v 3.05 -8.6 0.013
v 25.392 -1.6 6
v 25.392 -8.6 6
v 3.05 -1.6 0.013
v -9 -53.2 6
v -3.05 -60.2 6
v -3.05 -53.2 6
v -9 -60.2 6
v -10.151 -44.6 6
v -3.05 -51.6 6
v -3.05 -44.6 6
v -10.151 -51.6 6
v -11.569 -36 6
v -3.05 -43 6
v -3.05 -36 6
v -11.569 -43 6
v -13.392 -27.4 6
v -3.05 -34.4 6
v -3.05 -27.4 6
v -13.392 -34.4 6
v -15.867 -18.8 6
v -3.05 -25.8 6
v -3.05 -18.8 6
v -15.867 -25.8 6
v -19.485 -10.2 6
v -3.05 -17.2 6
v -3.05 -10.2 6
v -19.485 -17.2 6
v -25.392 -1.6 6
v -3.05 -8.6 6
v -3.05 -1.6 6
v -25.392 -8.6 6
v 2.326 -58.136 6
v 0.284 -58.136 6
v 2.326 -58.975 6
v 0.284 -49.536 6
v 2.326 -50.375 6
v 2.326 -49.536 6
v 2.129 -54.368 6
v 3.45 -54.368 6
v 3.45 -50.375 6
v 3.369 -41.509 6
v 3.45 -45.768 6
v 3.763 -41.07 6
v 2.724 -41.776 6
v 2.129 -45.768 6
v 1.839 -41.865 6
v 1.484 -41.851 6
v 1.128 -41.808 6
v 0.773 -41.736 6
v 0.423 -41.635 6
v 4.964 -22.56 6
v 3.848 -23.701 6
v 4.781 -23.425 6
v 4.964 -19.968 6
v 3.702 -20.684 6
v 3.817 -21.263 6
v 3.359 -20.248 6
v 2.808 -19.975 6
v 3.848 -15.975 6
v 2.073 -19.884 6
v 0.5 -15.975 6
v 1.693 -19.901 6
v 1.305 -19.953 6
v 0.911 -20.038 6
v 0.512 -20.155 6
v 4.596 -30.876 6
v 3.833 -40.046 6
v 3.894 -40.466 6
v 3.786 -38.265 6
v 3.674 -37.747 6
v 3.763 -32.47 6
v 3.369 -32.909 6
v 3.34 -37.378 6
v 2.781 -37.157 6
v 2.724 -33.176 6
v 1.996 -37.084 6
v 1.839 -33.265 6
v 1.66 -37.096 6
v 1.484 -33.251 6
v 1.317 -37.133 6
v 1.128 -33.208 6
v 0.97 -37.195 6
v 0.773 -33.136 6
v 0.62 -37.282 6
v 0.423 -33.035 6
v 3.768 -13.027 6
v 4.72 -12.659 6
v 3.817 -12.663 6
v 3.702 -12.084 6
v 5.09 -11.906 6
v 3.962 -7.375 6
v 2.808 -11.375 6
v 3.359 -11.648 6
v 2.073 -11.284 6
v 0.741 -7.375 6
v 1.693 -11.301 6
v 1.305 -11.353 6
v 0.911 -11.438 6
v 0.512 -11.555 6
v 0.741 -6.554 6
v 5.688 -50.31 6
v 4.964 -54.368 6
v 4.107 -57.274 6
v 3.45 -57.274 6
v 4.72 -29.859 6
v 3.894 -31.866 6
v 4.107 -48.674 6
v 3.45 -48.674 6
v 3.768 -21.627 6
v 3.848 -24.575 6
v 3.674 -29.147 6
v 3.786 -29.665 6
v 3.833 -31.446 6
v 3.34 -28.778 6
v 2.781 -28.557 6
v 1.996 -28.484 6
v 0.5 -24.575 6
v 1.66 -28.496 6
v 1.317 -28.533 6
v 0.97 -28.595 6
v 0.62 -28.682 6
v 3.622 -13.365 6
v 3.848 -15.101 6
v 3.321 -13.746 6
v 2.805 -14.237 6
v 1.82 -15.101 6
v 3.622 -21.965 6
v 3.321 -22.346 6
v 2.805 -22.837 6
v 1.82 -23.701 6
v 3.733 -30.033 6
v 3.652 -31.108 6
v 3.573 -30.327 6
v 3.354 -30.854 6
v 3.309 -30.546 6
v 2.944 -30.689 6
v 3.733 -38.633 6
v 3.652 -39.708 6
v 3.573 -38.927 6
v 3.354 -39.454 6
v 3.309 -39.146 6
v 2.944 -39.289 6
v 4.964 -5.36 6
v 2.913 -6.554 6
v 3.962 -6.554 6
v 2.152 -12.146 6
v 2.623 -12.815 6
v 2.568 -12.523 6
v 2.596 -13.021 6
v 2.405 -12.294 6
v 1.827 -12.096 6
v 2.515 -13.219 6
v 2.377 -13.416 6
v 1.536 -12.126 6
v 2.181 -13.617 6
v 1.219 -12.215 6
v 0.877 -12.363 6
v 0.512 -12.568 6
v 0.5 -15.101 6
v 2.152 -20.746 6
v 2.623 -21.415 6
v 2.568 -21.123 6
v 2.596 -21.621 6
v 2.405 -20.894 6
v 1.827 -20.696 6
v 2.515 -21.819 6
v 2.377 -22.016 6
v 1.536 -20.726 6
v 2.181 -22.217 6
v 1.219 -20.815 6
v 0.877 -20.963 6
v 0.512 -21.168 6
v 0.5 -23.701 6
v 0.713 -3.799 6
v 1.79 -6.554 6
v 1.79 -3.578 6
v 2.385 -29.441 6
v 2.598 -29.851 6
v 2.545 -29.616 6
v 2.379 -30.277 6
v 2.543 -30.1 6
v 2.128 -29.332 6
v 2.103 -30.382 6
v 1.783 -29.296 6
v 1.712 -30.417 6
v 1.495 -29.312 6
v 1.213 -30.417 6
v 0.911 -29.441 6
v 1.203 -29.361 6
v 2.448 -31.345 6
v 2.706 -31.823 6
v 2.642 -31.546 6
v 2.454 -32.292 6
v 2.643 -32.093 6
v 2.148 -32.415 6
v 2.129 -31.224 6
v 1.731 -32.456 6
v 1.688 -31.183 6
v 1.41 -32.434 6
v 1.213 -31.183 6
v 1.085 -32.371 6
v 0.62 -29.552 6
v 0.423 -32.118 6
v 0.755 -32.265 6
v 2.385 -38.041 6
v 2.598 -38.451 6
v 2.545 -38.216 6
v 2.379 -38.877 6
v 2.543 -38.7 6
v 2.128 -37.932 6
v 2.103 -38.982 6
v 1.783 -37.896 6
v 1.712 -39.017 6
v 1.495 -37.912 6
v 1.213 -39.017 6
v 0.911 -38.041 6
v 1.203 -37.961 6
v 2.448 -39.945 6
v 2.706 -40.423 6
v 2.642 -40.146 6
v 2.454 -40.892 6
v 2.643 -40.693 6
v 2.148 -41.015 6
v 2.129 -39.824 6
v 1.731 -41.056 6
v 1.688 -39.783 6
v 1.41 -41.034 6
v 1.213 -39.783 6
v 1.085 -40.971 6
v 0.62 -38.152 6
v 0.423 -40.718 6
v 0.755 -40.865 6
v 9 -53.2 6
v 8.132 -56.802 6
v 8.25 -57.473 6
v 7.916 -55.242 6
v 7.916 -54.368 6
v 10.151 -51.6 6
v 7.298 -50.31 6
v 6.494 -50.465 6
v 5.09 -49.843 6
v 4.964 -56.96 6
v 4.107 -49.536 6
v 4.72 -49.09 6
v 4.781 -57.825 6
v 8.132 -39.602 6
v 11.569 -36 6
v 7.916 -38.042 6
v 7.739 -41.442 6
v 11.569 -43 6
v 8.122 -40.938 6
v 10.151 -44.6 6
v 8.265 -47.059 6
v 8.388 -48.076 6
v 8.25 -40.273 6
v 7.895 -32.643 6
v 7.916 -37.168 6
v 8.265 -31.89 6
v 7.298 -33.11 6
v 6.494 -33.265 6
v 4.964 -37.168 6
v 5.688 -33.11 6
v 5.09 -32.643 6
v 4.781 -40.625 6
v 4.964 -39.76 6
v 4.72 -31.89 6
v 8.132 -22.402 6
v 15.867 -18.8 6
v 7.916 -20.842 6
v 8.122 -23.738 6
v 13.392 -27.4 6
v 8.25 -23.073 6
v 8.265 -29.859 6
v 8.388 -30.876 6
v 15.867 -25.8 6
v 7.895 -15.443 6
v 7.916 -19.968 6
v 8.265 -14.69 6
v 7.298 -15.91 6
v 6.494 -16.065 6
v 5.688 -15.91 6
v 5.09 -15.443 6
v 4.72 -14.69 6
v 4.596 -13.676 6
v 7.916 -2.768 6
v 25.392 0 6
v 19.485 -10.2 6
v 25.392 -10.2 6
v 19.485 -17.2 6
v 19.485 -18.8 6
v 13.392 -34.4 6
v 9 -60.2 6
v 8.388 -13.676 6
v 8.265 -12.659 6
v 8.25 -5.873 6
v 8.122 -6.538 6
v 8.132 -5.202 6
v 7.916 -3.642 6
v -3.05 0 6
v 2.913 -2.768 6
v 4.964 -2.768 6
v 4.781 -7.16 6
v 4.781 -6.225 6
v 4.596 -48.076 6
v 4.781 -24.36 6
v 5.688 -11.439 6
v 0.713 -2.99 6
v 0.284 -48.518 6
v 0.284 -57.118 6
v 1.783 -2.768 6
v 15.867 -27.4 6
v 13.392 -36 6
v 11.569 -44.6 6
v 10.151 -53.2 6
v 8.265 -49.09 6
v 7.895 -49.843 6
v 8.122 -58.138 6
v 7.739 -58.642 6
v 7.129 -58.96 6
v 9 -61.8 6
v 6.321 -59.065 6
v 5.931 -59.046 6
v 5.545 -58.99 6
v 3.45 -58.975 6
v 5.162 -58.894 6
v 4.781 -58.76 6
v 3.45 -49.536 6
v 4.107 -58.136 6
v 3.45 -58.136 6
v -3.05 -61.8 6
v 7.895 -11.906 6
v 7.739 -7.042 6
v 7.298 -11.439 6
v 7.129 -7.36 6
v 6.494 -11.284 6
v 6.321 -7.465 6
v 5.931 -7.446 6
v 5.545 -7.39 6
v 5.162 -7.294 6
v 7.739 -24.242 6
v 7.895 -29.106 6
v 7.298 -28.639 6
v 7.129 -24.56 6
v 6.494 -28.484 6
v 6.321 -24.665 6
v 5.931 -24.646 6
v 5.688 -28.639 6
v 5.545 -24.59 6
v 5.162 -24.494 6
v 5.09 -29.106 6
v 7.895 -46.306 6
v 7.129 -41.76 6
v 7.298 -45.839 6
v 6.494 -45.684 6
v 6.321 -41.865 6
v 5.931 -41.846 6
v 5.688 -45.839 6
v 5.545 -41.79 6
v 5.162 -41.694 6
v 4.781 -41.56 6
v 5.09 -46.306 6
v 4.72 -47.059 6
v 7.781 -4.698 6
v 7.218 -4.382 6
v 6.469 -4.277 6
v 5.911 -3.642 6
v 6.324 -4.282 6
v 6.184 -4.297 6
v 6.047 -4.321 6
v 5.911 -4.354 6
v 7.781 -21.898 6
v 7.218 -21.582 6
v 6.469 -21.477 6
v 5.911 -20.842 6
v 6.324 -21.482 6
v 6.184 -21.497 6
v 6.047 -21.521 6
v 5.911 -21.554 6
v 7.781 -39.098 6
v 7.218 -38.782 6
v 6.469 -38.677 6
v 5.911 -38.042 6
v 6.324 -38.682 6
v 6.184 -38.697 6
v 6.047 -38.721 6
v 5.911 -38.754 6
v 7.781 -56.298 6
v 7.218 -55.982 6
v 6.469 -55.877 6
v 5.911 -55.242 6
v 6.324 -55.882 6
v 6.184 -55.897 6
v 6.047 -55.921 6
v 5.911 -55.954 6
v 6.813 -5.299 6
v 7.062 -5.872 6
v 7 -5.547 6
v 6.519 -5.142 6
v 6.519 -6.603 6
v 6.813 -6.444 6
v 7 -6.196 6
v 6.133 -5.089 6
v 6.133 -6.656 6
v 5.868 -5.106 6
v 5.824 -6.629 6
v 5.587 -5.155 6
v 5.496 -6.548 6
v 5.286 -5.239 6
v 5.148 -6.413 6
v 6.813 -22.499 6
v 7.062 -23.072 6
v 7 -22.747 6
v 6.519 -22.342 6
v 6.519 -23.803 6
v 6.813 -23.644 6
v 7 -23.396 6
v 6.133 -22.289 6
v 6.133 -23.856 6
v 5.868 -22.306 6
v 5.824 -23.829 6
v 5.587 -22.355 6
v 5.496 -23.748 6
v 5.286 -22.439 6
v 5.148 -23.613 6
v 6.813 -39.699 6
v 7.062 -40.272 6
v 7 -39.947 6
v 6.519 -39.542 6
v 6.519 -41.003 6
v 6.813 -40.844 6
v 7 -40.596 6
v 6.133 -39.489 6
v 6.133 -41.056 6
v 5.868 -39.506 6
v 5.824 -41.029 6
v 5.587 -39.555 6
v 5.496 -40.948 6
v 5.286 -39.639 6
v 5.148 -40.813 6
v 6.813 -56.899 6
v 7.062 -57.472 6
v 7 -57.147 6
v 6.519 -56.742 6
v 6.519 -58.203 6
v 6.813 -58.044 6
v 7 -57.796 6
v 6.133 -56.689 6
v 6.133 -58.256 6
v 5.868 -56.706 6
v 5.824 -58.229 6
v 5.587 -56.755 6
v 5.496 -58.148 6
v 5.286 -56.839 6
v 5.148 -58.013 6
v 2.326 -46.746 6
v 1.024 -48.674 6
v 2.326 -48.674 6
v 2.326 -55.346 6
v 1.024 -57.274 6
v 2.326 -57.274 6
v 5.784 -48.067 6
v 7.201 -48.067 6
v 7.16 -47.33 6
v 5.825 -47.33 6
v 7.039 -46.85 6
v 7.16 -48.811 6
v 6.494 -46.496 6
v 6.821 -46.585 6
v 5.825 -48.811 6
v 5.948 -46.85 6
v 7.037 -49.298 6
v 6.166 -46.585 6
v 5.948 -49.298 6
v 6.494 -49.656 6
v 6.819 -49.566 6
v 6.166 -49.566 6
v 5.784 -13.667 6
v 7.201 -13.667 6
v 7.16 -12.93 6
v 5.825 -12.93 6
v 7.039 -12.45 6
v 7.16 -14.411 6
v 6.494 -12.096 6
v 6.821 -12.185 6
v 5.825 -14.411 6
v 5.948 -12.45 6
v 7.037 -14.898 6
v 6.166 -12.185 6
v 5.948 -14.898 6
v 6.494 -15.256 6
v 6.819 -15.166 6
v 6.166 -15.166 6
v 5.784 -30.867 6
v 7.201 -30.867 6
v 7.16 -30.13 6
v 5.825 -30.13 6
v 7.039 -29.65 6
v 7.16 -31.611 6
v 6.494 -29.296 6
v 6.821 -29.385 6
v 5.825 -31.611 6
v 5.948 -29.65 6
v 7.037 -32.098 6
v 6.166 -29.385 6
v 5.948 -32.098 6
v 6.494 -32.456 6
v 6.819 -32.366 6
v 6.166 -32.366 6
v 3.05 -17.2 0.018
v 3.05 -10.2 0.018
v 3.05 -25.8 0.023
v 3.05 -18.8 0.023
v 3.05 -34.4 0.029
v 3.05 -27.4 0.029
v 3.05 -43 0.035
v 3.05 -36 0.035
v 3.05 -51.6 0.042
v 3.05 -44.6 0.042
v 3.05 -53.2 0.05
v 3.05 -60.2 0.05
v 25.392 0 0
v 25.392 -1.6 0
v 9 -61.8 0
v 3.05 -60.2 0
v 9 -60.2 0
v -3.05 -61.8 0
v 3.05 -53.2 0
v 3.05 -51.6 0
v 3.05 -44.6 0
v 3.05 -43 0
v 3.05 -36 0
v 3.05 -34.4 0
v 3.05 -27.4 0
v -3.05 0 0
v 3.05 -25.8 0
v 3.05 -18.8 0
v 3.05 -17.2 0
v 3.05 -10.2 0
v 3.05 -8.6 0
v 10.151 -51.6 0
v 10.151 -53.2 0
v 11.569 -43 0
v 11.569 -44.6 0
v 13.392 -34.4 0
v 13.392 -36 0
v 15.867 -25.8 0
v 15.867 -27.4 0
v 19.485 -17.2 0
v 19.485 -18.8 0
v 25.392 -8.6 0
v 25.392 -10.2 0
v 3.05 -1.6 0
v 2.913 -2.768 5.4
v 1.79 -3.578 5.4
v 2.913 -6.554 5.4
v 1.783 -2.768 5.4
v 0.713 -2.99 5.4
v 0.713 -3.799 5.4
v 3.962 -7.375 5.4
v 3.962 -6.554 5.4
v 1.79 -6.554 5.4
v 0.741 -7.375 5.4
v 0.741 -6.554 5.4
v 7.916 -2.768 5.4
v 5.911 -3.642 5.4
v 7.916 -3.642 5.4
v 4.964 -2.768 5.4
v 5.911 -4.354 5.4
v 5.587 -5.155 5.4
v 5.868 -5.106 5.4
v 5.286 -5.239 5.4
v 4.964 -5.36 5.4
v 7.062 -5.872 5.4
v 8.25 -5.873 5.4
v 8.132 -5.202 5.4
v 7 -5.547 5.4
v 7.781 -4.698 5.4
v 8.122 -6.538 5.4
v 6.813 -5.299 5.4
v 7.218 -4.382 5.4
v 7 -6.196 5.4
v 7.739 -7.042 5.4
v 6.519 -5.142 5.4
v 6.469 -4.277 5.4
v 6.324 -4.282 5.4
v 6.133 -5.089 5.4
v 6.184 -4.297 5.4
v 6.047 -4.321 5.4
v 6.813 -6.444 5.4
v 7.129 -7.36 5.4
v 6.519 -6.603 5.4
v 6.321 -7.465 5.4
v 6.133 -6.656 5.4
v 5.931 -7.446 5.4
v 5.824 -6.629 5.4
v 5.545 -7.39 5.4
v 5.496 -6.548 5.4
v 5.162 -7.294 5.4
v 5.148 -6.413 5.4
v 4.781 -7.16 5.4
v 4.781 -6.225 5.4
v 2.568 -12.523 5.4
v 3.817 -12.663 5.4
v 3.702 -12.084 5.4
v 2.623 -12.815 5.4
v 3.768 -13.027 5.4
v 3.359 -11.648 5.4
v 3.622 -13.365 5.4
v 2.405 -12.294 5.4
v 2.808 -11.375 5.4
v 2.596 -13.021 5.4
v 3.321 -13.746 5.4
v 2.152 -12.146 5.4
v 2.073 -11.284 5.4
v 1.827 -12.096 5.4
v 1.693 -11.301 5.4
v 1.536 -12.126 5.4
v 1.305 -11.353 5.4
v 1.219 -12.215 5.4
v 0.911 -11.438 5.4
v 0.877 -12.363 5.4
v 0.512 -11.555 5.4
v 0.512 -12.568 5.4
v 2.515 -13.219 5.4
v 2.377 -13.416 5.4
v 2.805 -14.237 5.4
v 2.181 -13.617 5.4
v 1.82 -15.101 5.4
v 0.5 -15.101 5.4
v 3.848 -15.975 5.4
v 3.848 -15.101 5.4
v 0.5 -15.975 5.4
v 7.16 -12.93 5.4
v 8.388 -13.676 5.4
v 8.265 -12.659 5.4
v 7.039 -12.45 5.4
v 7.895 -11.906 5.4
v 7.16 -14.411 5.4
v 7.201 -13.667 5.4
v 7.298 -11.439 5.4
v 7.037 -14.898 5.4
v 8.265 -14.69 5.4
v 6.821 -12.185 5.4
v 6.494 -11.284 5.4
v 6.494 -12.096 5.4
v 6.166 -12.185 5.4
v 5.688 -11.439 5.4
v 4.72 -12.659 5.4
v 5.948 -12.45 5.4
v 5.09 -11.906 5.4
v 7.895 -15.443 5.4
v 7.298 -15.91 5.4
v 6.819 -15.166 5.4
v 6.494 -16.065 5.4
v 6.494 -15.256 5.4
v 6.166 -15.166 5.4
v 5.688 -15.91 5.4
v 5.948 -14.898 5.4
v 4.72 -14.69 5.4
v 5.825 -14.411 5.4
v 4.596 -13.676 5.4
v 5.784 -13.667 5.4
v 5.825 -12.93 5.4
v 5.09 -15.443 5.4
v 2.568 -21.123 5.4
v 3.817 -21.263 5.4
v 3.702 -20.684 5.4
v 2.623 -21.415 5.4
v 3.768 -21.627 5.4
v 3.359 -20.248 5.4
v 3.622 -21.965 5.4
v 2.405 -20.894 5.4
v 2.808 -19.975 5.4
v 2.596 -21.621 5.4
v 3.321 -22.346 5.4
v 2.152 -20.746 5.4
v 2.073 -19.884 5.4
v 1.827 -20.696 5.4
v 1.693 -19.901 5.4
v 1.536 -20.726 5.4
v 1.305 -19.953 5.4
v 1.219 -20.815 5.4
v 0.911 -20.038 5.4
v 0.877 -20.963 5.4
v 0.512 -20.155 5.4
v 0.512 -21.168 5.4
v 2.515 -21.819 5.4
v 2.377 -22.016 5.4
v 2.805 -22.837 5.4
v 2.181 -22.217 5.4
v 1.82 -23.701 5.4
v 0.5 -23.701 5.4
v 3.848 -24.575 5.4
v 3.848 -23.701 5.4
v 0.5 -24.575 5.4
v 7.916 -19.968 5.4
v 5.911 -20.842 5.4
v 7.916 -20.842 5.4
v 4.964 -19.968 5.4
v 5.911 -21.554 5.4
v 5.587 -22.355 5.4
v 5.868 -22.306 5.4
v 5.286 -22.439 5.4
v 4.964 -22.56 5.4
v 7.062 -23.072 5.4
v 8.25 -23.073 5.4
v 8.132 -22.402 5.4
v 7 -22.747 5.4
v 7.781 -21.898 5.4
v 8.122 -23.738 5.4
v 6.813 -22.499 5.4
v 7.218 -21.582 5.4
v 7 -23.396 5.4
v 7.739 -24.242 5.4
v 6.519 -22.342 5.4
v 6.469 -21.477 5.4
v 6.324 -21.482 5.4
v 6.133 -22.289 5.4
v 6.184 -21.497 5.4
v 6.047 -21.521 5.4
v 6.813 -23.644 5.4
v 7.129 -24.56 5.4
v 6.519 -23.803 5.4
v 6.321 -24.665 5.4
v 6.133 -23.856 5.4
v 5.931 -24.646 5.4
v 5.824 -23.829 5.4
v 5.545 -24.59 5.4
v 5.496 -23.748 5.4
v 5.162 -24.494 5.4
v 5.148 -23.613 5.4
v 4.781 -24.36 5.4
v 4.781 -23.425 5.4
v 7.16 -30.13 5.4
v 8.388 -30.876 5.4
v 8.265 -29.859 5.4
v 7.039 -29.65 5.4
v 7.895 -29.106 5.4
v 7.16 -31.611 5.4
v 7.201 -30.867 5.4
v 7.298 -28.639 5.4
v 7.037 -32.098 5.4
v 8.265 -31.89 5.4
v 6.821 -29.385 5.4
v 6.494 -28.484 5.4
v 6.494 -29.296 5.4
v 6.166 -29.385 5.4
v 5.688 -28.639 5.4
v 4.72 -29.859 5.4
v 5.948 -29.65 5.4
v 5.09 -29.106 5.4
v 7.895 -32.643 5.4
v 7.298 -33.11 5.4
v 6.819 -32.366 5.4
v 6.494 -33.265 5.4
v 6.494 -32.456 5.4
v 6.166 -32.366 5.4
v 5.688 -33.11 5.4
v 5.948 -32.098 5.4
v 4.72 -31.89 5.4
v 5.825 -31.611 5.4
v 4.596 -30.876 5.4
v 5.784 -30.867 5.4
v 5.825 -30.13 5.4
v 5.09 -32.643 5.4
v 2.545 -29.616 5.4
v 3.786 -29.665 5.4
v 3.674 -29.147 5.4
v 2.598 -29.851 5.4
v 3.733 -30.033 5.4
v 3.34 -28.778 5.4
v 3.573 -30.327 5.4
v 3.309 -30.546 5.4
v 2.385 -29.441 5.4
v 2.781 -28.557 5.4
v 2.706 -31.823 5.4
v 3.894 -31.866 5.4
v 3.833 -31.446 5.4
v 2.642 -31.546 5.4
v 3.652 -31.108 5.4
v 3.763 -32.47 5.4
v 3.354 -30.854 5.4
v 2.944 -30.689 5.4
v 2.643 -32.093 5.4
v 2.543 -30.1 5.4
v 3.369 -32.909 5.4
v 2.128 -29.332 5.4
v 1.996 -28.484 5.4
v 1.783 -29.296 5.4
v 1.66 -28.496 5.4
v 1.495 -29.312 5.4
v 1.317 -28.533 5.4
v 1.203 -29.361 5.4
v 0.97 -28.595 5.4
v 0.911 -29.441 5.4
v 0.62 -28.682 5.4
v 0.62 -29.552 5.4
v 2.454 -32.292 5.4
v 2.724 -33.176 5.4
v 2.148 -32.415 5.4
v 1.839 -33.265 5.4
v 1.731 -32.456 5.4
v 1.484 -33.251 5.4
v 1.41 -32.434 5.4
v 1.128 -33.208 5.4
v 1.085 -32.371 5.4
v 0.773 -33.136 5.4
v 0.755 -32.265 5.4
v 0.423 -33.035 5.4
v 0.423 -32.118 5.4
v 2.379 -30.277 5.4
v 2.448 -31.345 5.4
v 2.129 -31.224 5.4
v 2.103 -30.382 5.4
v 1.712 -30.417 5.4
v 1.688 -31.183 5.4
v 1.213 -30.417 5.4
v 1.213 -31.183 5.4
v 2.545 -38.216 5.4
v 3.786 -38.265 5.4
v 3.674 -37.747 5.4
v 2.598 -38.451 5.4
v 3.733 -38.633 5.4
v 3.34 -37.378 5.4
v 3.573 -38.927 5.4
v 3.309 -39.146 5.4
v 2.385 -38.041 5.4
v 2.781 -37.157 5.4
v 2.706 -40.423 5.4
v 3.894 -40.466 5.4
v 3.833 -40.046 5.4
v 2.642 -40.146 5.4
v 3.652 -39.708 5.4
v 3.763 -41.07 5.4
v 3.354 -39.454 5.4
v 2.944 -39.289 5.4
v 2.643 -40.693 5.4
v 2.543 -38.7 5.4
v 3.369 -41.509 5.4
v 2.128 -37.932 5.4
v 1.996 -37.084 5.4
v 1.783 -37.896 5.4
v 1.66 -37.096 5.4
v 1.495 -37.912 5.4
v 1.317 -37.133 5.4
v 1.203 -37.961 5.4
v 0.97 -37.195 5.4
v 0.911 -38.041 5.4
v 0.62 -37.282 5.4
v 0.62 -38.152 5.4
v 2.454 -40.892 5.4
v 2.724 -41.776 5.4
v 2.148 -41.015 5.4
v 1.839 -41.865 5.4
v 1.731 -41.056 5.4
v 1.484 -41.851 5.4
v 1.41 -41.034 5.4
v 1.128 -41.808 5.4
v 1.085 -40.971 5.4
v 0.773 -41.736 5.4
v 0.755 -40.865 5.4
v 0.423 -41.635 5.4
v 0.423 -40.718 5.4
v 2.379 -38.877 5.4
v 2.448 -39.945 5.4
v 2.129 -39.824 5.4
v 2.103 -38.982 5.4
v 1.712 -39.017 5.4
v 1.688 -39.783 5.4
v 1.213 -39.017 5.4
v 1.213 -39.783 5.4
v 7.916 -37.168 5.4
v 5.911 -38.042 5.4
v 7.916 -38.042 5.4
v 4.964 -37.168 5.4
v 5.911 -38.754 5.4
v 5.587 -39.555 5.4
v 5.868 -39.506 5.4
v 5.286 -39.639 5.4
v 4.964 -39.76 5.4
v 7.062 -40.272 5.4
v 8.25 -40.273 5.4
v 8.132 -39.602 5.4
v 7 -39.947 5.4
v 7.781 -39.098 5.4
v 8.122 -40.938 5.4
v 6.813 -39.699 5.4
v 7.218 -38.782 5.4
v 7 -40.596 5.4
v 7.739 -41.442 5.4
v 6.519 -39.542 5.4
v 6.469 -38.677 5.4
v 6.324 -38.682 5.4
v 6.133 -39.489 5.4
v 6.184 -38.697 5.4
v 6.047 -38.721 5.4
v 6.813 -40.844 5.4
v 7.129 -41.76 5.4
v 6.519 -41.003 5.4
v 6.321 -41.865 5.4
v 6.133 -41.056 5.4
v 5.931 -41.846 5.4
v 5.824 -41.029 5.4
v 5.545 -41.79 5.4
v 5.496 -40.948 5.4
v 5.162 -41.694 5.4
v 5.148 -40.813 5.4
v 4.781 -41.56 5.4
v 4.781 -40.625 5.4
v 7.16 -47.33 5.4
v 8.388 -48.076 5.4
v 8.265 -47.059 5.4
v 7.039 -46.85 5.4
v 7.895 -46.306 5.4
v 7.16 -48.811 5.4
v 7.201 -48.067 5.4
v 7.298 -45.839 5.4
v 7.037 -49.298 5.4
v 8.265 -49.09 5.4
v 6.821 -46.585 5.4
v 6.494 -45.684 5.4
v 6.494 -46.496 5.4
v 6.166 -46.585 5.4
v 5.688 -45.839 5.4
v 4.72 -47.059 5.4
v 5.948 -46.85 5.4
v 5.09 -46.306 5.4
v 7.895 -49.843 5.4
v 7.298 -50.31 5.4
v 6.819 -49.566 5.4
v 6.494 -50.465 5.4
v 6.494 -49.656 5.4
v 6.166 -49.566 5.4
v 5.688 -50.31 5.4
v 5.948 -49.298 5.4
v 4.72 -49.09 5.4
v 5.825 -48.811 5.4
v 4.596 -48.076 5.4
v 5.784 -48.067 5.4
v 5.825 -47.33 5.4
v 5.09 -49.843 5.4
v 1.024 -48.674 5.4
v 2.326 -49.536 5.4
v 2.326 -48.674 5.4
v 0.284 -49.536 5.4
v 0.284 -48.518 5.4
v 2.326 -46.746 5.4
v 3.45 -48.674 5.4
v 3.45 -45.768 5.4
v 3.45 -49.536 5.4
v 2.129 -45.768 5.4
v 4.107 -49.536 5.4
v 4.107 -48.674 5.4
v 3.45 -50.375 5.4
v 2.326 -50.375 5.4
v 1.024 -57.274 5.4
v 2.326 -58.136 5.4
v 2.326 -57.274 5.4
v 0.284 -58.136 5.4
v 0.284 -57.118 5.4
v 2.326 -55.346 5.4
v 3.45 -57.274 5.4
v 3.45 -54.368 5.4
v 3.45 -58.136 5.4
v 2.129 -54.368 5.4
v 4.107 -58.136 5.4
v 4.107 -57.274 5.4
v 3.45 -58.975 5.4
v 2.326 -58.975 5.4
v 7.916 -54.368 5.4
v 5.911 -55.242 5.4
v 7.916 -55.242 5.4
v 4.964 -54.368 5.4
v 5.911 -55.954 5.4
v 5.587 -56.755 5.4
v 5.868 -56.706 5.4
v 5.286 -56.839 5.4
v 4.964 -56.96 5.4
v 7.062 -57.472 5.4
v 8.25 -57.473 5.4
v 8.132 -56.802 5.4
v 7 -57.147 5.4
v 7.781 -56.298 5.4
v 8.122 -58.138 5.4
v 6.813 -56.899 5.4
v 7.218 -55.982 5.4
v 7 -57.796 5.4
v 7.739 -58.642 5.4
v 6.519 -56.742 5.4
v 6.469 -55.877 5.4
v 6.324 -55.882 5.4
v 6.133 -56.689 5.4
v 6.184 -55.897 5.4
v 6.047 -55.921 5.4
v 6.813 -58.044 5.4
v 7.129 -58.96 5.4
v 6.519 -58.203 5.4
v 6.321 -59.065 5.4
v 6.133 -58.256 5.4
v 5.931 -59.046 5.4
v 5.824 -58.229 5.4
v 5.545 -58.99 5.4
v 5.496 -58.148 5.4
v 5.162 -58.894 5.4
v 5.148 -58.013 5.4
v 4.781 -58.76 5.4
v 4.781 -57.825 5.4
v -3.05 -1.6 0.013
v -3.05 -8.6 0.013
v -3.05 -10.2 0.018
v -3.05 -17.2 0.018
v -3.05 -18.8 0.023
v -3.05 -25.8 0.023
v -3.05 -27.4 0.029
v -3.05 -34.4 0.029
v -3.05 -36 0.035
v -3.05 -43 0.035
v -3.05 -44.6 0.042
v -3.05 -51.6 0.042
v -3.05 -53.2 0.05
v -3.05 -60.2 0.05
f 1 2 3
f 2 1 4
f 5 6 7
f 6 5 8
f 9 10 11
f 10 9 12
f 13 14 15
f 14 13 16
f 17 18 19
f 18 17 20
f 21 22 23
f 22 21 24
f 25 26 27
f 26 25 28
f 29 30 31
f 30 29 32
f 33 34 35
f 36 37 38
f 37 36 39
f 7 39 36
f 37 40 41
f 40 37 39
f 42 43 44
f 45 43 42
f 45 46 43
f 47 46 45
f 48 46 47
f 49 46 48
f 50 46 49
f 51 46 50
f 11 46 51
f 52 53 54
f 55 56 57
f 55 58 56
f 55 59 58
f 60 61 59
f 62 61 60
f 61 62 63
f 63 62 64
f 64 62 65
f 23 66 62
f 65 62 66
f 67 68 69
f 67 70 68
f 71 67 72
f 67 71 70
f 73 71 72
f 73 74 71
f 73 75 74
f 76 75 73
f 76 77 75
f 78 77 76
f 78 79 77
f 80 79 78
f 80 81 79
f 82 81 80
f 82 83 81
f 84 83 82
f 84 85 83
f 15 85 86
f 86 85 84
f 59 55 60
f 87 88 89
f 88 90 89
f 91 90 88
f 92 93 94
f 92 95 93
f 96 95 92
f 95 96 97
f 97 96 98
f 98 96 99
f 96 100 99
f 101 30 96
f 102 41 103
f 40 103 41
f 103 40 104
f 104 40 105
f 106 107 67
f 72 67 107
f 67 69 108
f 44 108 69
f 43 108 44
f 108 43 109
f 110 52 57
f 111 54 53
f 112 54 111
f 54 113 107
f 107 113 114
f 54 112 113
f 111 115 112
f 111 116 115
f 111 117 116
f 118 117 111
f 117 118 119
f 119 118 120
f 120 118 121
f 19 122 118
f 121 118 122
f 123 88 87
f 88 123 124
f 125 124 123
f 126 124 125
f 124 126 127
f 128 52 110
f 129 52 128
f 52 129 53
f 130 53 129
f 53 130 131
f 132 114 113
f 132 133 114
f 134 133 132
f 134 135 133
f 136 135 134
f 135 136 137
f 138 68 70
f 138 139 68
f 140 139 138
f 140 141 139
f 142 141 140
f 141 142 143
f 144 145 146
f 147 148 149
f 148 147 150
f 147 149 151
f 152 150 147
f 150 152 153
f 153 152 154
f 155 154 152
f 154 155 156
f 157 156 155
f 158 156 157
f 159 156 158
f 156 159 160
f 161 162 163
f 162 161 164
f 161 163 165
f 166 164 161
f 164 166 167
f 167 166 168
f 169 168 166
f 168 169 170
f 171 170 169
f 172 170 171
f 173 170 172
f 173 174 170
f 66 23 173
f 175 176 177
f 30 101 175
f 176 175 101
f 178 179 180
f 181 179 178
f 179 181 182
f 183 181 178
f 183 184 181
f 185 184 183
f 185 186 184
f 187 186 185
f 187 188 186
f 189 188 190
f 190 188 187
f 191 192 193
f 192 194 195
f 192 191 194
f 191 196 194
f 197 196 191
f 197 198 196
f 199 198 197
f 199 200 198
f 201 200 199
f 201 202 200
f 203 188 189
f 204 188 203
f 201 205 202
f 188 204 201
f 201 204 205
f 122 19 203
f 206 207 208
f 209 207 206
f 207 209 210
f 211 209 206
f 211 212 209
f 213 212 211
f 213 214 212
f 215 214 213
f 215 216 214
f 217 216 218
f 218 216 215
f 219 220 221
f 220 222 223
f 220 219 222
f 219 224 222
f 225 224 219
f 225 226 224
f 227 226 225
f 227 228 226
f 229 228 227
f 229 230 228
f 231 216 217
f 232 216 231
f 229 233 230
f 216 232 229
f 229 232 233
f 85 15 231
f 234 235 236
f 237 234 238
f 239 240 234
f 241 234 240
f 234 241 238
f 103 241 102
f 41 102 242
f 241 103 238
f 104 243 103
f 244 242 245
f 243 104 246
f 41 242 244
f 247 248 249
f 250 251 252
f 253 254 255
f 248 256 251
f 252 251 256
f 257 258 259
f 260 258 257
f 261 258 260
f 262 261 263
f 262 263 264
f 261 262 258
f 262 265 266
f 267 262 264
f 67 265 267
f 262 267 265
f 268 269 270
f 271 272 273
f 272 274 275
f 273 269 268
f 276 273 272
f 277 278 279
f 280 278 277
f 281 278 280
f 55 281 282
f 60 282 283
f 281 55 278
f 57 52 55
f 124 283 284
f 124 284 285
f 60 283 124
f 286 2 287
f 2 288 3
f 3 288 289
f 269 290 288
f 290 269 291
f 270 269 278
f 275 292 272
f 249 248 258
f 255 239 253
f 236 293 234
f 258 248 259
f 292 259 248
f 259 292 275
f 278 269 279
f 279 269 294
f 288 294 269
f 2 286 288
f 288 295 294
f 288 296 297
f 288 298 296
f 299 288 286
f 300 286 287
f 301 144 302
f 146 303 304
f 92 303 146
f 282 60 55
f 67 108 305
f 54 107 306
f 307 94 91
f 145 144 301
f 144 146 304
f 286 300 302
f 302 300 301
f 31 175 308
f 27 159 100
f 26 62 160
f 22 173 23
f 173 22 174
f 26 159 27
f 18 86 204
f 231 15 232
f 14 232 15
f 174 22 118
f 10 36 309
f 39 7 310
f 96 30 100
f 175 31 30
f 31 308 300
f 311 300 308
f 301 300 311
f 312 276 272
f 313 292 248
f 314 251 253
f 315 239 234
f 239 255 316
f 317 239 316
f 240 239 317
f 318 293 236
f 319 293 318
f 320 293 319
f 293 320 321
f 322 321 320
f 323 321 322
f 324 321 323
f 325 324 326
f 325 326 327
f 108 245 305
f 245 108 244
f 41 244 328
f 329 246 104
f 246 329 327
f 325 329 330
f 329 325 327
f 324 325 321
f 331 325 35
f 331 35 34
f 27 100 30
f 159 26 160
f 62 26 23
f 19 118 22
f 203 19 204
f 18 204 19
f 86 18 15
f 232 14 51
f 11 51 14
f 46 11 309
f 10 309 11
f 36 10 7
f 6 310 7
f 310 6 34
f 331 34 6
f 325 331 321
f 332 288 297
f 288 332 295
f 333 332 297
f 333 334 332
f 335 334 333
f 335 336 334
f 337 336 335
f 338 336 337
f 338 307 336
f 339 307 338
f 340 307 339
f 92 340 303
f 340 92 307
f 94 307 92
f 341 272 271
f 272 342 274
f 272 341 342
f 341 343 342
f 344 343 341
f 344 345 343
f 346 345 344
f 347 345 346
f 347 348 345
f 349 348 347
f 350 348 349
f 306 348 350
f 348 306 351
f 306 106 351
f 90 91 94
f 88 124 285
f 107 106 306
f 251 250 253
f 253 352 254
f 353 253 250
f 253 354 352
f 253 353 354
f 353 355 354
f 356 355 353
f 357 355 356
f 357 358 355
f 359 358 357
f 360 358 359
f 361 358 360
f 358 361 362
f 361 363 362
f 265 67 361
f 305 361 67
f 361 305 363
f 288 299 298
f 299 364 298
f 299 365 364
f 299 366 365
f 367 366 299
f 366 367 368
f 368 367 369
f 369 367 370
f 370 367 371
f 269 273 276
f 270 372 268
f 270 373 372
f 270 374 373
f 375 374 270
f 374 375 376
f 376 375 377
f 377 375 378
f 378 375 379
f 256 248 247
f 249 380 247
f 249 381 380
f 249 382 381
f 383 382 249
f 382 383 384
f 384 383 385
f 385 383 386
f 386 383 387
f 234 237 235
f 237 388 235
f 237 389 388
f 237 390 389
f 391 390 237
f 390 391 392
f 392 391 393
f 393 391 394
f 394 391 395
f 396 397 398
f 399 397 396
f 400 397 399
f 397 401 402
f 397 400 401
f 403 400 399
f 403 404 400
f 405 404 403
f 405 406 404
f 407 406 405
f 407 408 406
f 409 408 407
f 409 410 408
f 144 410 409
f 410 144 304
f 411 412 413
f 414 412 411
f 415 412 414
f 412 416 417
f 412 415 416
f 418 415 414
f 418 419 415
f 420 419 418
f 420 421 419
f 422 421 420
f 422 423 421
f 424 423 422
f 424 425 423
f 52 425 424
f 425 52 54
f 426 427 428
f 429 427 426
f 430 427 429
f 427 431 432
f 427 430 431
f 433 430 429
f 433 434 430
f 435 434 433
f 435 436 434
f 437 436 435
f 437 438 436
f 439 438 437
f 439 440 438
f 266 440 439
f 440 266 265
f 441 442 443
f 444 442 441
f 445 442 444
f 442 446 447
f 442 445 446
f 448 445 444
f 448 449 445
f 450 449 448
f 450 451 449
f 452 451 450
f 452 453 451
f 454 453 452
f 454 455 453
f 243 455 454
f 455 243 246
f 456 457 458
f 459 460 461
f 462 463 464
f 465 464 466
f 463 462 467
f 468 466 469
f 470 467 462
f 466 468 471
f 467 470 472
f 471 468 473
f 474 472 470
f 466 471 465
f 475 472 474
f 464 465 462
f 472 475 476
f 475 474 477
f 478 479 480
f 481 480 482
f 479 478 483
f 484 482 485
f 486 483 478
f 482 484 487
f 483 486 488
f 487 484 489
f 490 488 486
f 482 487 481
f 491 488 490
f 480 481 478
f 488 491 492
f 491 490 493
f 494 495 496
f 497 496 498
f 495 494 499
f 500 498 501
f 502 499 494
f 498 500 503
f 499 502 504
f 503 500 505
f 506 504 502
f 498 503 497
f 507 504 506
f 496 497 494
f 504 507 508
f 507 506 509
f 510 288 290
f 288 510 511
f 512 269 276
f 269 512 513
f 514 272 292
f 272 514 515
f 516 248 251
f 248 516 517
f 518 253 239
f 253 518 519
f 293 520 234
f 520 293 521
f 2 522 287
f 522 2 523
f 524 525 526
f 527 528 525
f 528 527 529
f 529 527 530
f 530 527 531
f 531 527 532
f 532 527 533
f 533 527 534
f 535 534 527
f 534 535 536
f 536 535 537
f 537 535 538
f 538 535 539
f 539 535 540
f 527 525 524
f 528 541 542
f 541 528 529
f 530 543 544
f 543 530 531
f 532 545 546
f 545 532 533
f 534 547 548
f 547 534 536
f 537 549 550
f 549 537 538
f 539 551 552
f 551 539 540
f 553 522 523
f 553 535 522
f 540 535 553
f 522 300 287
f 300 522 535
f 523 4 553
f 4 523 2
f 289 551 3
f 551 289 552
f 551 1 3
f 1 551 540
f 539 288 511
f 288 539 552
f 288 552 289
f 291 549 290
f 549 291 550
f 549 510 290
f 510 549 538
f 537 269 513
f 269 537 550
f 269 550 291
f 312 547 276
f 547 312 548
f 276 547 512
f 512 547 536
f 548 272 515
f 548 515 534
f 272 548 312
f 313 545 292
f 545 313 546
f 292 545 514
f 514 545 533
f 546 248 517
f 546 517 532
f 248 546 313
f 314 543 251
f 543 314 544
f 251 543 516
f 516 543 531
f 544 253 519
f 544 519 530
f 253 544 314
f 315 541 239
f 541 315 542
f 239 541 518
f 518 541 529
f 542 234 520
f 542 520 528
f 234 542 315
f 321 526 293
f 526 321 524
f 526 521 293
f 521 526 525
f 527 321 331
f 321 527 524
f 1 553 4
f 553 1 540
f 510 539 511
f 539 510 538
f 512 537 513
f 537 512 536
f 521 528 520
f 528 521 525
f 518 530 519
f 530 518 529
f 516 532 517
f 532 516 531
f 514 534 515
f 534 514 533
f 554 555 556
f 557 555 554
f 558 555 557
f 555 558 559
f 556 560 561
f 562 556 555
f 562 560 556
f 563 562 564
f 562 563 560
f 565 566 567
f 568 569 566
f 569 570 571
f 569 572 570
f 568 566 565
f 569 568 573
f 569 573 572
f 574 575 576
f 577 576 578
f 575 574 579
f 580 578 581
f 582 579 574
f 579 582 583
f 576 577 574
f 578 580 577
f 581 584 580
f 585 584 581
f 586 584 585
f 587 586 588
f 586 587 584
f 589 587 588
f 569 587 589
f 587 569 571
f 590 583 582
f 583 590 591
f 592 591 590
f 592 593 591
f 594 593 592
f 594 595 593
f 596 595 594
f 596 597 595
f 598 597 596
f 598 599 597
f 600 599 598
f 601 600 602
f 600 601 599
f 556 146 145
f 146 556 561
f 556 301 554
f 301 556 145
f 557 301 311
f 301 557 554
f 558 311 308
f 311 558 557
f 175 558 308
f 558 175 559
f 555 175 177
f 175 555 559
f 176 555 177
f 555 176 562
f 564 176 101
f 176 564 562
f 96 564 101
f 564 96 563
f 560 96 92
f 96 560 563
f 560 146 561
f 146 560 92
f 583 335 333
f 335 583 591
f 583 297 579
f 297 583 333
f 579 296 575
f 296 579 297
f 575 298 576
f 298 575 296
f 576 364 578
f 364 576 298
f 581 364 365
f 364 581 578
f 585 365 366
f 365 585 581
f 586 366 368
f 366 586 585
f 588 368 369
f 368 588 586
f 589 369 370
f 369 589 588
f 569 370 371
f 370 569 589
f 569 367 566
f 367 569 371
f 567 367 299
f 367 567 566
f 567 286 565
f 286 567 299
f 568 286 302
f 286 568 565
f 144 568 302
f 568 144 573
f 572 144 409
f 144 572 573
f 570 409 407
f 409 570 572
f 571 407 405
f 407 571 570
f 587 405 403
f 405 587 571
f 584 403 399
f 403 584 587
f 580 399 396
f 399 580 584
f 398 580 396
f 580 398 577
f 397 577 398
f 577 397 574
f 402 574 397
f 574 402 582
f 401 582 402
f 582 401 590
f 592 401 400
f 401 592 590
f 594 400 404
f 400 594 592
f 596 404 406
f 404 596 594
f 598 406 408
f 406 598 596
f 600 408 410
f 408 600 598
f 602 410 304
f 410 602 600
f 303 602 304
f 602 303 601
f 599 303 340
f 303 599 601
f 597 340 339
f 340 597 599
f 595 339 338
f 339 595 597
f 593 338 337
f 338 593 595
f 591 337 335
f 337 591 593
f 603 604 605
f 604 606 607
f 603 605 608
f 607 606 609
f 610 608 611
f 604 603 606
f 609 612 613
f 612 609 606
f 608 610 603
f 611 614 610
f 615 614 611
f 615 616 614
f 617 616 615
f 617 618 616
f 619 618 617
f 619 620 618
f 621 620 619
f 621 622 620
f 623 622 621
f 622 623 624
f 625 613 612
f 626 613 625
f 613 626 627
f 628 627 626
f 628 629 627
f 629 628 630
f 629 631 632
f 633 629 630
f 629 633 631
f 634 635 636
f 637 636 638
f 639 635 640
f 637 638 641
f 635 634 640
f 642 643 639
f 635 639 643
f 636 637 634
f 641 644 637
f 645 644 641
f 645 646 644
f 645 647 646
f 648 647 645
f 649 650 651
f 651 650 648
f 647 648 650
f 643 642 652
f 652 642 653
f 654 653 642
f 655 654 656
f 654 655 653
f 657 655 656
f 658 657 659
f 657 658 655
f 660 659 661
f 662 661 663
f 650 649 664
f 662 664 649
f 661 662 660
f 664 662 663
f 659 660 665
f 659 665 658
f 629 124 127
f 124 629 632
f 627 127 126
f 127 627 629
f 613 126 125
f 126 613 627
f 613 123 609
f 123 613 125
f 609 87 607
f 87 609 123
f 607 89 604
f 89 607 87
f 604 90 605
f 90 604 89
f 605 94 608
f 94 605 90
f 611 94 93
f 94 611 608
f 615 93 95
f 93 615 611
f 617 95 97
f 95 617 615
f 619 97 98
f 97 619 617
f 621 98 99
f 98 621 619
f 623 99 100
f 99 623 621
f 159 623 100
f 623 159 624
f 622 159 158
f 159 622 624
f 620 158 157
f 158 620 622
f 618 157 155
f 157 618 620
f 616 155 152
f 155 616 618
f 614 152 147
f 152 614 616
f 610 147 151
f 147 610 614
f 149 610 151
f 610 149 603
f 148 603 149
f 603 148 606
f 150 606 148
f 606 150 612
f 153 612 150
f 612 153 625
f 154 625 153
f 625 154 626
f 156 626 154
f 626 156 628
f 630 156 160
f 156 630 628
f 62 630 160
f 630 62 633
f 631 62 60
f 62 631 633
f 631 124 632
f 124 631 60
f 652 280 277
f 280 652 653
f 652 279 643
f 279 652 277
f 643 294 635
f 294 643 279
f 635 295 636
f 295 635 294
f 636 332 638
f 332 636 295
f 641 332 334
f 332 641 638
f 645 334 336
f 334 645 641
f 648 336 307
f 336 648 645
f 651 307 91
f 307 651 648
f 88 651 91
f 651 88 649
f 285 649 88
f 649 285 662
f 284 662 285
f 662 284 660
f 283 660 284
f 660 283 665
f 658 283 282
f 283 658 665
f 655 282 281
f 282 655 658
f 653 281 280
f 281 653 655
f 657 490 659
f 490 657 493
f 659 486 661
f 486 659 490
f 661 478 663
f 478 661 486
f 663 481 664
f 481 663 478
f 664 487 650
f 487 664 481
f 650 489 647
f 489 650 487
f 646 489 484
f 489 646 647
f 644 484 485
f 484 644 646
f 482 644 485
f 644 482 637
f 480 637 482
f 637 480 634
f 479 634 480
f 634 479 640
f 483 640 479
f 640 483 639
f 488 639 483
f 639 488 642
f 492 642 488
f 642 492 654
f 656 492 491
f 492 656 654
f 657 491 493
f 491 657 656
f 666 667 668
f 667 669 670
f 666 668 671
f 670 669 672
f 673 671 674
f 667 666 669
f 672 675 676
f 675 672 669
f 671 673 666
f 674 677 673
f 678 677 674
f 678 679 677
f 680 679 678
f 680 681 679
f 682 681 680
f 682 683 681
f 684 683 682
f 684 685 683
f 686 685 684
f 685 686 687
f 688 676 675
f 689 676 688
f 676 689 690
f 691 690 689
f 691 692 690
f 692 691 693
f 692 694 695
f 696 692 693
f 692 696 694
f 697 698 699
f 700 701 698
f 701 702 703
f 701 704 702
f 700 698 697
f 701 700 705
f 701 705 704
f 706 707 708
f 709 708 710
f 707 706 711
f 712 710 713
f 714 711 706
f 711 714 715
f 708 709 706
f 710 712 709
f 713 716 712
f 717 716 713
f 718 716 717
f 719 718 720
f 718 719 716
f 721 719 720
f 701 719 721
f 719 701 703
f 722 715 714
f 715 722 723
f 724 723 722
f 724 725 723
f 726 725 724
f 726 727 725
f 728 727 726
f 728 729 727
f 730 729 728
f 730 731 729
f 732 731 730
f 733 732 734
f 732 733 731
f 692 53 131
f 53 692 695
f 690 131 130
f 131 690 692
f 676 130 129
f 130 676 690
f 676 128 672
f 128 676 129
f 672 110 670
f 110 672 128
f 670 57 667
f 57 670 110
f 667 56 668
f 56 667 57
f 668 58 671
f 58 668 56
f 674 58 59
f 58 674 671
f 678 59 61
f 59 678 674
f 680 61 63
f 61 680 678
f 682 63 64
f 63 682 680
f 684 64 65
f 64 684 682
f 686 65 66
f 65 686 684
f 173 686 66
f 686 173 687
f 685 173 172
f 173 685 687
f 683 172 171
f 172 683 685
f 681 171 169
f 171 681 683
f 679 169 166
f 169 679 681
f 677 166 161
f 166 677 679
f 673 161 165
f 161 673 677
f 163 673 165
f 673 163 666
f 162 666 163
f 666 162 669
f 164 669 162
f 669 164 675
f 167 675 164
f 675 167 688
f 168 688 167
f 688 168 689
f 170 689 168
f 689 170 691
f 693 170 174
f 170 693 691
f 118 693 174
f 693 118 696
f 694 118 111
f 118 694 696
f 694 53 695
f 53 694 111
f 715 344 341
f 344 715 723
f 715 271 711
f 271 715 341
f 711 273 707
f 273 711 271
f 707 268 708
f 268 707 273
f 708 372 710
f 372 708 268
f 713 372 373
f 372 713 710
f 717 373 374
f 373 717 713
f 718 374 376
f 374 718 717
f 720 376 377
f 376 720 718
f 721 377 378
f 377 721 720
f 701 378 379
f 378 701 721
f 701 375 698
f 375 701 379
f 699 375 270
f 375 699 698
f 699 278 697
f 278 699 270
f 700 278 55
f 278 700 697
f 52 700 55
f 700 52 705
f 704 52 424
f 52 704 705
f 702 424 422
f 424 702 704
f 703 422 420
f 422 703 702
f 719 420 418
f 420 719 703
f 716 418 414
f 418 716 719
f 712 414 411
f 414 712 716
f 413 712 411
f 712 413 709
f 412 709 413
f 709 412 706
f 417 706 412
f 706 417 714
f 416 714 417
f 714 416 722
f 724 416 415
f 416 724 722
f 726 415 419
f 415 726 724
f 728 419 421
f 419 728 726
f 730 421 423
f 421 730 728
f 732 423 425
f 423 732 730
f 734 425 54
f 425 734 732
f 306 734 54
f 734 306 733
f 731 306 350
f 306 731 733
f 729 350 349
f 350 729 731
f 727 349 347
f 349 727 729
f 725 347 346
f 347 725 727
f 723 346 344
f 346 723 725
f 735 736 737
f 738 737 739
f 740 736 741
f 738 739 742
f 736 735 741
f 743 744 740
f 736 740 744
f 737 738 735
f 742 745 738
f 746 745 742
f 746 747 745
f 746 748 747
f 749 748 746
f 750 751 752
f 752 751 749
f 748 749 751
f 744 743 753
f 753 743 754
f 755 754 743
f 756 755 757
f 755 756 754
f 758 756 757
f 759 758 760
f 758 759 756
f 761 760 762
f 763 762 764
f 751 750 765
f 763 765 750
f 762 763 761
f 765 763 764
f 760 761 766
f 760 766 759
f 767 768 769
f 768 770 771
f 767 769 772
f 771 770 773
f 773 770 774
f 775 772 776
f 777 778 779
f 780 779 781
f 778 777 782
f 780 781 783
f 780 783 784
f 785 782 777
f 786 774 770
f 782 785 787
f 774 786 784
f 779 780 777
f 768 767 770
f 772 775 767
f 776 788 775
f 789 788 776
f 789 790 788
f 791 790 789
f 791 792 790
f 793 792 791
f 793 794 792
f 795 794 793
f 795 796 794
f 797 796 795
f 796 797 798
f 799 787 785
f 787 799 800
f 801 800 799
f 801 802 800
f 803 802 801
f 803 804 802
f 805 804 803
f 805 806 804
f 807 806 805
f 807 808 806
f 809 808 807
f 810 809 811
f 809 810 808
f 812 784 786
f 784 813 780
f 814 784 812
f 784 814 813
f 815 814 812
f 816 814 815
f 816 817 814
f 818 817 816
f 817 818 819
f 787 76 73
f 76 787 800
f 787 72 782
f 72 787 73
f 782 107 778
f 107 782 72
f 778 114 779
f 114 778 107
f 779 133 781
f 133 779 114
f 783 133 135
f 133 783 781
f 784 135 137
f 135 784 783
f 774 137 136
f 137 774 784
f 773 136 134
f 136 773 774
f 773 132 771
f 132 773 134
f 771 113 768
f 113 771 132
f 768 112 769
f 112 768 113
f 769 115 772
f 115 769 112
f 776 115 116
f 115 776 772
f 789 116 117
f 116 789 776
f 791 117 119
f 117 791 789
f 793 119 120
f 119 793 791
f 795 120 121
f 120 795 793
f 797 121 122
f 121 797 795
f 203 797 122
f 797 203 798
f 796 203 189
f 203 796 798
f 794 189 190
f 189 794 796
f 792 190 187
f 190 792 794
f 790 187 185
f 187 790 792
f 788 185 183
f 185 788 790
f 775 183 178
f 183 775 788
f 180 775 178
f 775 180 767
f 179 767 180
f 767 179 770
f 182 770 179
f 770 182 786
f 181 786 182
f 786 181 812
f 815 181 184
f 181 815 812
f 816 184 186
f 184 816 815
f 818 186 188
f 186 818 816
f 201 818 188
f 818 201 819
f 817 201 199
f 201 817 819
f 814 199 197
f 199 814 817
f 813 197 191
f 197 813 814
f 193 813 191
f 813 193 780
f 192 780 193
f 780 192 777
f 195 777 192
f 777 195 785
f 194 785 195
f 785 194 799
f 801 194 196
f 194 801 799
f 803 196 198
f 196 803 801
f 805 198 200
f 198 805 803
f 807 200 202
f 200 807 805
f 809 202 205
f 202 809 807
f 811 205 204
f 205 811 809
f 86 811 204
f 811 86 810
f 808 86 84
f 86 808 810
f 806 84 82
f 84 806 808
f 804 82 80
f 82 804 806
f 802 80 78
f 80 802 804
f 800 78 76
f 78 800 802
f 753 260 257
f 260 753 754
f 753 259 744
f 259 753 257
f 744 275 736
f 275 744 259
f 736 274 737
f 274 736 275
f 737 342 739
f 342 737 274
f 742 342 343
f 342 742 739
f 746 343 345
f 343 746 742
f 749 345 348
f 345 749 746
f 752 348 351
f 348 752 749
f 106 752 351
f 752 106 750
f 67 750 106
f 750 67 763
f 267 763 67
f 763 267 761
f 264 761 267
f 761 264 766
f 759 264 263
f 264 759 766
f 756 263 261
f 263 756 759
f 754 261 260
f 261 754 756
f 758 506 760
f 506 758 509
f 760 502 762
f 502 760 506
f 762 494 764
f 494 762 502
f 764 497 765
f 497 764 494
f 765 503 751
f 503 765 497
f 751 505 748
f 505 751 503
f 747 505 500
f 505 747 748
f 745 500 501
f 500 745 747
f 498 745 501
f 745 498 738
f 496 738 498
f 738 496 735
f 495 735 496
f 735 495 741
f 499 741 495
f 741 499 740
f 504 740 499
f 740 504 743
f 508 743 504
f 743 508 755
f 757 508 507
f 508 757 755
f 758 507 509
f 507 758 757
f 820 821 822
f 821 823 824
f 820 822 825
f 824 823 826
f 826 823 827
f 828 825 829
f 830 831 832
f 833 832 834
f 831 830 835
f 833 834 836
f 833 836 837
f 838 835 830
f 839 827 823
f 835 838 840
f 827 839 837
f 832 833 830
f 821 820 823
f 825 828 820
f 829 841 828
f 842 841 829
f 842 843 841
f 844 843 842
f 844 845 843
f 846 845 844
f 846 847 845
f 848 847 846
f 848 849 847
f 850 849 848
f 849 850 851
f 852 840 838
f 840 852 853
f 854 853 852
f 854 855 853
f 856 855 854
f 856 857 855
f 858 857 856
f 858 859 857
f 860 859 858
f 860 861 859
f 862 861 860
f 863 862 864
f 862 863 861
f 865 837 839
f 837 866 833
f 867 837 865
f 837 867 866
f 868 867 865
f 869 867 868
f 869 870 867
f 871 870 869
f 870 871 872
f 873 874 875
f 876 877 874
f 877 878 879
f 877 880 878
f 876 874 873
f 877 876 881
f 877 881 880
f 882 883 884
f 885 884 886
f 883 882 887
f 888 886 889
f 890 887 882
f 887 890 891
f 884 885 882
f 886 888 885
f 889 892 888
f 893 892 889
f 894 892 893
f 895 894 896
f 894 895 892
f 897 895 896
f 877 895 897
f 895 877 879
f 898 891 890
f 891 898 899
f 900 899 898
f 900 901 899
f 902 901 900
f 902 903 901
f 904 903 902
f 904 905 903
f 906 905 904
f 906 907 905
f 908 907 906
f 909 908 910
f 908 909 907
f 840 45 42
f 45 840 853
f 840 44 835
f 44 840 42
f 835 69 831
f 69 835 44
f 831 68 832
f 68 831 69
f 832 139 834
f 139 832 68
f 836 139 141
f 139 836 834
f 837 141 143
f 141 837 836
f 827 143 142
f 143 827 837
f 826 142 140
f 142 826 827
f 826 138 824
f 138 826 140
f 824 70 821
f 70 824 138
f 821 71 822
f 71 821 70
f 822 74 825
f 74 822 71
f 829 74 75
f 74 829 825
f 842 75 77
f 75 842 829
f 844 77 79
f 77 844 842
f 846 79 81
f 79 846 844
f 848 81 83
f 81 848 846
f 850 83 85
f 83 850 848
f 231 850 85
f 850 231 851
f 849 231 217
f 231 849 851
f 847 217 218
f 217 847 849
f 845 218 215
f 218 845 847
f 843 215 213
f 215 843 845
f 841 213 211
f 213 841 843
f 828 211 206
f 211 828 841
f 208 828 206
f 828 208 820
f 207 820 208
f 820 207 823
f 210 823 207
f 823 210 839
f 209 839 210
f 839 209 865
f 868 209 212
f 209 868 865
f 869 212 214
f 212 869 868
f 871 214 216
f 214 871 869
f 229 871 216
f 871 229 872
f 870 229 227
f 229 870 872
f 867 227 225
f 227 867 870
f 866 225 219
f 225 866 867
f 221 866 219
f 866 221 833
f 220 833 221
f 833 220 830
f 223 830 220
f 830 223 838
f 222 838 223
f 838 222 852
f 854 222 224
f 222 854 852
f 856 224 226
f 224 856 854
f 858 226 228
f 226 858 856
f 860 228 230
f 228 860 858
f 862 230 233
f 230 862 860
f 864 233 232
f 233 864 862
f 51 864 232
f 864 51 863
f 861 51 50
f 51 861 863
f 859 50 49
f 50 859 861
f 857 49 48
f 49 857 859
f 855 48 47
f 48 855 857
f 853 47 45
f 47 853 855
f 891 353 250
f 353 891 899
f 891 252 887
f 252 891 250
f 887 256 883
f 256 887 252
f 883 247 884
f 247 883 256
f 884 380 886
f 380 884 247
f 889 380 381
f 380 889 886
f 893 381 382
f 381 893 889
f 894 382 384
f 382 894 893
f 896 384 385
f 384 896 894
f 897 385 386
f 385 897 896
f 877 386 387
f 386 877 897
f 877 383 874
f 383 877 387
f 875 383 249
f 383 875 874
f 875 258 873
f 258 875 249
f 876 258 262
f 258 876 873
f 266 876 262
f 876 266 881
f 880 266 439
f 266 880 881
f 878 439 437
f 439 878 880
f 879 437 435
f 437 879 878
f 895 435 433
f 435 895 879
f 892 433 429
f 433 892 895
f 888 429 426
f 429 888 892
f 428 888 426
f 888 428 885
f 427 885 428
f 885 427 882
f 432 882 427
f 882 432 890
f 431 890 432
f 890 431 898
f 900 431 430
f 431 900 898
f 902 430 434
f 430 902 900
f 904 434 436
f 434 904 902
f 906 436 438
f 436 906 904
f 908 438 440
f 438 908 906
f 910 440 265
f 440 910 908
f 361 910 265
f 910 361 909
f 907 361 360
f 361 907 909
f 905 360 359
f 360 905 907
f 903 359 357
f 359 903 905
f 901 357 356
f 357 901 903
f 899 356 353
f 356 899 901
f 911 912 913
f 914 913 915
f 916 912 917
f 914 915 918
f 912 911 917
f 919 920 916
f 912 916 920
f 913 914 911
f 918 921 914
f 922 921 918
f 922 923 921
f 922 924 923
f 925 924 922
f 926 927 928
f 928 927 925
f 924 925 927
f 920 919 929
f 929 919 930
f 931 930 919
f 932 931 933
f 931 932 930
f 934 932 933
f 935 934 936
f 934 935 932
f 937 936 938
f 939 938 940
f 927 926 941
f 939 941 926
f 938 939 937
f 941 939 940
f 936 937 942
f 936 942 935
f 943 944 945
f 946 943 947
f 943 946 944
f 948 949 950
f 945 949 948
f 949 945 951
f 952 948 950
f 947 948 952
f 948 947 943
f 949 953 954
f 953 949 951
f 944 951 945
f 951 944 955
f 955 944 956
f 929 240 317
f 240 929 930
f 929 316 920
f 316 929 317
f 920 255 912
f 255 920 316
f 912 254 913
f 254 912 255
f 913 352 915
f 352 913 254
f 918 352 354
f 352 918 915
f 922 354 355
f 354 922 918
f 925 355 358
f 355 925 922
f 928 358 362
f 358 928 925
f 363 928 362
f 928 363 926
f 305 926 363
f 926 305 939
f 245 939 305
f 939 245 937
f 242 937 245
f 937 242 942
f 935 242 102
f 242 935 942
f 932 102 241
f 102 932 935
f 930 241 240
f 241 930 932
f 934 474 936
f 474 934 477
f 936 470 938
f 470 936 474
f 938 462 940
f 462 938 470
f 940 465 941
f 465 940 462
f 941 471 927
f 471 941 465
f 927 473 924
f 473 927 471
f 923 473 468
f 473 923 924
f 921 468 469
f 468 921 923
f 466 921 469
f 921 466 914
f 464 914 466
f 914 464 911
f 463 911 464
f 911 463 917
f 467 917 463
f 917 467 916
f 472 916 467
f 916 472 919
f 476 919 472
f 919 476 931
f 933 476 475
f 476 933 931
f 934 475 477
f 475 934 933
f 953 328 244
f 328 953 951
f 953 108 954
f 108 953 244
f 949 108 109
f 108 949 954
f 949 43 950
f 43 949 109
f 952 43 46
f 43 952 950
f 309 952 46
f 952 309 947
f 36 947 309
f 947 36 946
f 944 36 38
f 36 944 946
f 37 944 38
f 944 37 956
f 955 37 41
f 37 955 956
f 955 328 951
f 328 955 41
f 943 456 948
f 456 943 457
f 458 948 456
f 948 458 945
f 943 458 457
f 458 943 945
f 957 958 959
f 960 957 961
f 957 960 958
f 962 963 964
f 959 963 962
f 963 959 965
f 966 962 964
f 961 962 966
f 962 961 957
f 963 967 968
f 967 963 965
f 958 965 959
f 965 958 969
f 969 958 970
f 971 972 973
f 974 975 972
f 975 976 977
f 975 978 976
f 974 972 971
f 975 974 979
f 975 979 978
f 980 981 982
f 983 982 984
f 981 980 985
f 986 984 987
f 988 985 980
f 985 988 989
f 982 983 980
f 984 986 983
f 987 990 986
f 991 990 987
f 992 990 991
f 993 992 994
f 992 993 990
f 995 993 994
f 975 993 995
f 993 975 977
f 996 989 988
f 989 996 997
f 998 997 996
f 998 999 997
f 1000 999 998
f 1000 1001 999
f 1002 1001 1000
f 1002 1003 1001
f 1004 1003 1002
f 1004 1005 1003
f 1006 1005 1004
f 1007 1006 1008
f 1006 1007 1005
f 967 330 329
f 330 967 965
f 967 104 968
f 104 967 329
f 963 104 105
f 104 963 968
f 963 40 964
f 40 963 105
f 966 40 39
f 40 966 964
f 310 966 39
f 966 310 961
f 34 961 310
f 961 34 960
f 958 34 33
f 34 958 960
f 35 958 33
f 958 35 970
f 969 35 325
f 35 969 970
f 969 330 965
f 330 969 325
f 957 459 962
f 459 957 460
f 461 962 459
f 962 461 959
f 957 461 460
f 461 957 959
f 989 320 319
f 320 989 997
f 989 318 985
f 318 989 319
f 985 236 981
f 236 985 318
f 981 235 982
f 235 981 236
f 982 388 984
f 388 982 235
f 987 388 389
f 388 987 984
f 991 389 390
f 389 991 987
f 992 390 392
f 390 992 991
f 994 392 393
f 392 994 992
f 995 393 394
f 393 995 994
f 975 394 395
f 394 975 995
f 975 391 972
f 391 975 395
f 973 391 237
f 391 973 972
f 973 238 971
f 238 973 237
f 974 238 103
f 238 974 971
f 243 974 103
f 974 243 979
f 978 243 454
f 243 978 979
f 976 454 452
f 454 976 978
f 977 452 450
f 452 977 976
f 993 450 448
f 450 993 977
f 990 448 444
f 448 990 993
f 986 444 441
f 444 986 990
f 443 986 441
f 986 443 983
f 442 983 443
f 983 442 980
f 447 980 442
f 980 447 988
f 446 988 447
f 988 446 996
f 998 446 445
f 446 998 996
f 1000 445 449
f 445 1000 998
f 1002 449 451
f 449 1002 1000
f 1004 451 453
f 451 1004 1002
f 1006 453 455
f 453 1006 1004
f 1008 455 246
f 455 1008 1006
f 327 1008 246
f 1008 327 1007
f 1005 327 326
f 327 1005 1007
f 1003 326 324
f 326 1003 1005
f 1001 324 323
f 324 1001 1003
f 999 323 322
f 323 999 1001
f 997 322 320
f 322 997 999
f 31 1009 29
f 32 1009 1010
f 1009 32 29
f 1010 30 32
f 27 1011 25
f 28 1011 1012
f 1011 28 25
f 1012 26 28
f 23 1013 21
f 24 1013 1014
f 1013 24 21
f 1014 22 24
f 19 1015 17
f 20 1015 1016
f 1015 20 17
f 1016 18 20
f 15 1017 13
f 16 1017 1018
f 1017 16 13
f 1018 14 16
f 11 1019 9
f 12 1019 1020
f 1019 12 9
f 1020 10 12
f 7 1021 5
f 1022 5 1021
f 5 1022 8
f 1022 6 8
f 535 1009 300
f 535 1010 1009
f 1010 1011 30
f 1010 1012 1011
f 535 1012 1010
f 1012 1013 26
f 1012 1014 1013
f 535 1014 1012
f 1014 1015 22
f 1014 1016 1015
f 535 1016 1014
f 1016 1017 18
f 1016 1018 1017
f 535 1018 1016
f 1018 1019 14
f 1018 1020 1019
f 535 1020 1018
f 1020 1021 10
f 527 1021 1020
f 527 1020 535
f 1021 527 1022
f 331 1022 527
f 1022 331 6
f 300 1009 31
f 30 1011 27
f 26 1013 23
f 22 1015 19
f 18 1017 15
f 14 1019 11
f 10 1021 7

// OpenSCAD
// style of test print
_type = "both"; //[bridged, floating, both]

// start angle
_start = 15;

// end angle
_end = 45;

// angle increment between samples
_increment = 5;

// sample width
_width = 7.0; // [1:20]

// height
_height = 6.0; // [1:20]

_fontSizePercent = 65; // [0:100]

_spineWidth = 3; // [0:10]

function getLength(height,angle) = height/tan(angle);

module overhangTest(bridged, start, end, increment, width, height, spine, gap, fontSize, showLabels = true, offsetLabels = true) {
	num = (end-start)/increment + 1;
	length = width * num + gap * (num+1);
	fontFraction = fontSize/100;
	fontDepth = 0.6;
	step = width+gap;
	eps = 0.1;

	difference() {
		union() {
			translate([spine/2, -length/2, height/2]) {
				cube(size=[spine+eps,length,height], center=true);
			}
			
			for (angle = [start:increment:end]) {
				index = (angle-start)/increment + 1;
					translate([spine,-(step*index - width/2),0])
					rotate([90,0,0])
					linear_extrude(height = bridged ? width+eps : width, center = true, convexity = 2) {
						polygon(points=[[0,0],[getLength(height,angle),height],[0,height]], paths=[[0,1,2]]);
					}
				
			}

			// beams
			if (bridged) {
				for (index = [0:num]) {
					translate([0,-step*(index) - gap,0]) {
						cube(size=[getLength(height,start + increment * max(0,(index-1))) + spine, gap, height]);
					}
				}
			}
		}

		// labels
		if (showLabels) {
            Font="Orbitron:style=Bold";
			for (angle = [start:increment:end]) {
				y=step * ((angle-start)/increment +1);
				translate([offsetLabels ? width/4 : 0,-(y - width/2 + width * fontFraction/2),height-fontDepth]) 
                linear_extrude(fontDepth*2)
                text(str(angle), width*fontFraction, Font);
			}
		}
	}
}


module make(type, start, end, increment, width, height, fontSize, spineWidth) {
	gap = 1.6;

	if (_type == "floating") {
		overhangTest(false, start, end, increment, width, height, spineWidth, gap, fontSize);
	} else if (_type == "bridged") {
		overhangTest(true, start, end, increment, width, height, spineWidth, gap, fontSize);
	} else {
		overhangTest(true, start, end, increment, width, height, spineWidth, gap, fontSize, true, false);
		mirror([1,0,0]) {
			overhangTest(false, start, end, increment, width, height, spineWidth, gap, fontSize, false);
		}
	}
}


make(_type, _start, _end, _increment, _width, _height, _fontSizePercent, _spineWidth);
